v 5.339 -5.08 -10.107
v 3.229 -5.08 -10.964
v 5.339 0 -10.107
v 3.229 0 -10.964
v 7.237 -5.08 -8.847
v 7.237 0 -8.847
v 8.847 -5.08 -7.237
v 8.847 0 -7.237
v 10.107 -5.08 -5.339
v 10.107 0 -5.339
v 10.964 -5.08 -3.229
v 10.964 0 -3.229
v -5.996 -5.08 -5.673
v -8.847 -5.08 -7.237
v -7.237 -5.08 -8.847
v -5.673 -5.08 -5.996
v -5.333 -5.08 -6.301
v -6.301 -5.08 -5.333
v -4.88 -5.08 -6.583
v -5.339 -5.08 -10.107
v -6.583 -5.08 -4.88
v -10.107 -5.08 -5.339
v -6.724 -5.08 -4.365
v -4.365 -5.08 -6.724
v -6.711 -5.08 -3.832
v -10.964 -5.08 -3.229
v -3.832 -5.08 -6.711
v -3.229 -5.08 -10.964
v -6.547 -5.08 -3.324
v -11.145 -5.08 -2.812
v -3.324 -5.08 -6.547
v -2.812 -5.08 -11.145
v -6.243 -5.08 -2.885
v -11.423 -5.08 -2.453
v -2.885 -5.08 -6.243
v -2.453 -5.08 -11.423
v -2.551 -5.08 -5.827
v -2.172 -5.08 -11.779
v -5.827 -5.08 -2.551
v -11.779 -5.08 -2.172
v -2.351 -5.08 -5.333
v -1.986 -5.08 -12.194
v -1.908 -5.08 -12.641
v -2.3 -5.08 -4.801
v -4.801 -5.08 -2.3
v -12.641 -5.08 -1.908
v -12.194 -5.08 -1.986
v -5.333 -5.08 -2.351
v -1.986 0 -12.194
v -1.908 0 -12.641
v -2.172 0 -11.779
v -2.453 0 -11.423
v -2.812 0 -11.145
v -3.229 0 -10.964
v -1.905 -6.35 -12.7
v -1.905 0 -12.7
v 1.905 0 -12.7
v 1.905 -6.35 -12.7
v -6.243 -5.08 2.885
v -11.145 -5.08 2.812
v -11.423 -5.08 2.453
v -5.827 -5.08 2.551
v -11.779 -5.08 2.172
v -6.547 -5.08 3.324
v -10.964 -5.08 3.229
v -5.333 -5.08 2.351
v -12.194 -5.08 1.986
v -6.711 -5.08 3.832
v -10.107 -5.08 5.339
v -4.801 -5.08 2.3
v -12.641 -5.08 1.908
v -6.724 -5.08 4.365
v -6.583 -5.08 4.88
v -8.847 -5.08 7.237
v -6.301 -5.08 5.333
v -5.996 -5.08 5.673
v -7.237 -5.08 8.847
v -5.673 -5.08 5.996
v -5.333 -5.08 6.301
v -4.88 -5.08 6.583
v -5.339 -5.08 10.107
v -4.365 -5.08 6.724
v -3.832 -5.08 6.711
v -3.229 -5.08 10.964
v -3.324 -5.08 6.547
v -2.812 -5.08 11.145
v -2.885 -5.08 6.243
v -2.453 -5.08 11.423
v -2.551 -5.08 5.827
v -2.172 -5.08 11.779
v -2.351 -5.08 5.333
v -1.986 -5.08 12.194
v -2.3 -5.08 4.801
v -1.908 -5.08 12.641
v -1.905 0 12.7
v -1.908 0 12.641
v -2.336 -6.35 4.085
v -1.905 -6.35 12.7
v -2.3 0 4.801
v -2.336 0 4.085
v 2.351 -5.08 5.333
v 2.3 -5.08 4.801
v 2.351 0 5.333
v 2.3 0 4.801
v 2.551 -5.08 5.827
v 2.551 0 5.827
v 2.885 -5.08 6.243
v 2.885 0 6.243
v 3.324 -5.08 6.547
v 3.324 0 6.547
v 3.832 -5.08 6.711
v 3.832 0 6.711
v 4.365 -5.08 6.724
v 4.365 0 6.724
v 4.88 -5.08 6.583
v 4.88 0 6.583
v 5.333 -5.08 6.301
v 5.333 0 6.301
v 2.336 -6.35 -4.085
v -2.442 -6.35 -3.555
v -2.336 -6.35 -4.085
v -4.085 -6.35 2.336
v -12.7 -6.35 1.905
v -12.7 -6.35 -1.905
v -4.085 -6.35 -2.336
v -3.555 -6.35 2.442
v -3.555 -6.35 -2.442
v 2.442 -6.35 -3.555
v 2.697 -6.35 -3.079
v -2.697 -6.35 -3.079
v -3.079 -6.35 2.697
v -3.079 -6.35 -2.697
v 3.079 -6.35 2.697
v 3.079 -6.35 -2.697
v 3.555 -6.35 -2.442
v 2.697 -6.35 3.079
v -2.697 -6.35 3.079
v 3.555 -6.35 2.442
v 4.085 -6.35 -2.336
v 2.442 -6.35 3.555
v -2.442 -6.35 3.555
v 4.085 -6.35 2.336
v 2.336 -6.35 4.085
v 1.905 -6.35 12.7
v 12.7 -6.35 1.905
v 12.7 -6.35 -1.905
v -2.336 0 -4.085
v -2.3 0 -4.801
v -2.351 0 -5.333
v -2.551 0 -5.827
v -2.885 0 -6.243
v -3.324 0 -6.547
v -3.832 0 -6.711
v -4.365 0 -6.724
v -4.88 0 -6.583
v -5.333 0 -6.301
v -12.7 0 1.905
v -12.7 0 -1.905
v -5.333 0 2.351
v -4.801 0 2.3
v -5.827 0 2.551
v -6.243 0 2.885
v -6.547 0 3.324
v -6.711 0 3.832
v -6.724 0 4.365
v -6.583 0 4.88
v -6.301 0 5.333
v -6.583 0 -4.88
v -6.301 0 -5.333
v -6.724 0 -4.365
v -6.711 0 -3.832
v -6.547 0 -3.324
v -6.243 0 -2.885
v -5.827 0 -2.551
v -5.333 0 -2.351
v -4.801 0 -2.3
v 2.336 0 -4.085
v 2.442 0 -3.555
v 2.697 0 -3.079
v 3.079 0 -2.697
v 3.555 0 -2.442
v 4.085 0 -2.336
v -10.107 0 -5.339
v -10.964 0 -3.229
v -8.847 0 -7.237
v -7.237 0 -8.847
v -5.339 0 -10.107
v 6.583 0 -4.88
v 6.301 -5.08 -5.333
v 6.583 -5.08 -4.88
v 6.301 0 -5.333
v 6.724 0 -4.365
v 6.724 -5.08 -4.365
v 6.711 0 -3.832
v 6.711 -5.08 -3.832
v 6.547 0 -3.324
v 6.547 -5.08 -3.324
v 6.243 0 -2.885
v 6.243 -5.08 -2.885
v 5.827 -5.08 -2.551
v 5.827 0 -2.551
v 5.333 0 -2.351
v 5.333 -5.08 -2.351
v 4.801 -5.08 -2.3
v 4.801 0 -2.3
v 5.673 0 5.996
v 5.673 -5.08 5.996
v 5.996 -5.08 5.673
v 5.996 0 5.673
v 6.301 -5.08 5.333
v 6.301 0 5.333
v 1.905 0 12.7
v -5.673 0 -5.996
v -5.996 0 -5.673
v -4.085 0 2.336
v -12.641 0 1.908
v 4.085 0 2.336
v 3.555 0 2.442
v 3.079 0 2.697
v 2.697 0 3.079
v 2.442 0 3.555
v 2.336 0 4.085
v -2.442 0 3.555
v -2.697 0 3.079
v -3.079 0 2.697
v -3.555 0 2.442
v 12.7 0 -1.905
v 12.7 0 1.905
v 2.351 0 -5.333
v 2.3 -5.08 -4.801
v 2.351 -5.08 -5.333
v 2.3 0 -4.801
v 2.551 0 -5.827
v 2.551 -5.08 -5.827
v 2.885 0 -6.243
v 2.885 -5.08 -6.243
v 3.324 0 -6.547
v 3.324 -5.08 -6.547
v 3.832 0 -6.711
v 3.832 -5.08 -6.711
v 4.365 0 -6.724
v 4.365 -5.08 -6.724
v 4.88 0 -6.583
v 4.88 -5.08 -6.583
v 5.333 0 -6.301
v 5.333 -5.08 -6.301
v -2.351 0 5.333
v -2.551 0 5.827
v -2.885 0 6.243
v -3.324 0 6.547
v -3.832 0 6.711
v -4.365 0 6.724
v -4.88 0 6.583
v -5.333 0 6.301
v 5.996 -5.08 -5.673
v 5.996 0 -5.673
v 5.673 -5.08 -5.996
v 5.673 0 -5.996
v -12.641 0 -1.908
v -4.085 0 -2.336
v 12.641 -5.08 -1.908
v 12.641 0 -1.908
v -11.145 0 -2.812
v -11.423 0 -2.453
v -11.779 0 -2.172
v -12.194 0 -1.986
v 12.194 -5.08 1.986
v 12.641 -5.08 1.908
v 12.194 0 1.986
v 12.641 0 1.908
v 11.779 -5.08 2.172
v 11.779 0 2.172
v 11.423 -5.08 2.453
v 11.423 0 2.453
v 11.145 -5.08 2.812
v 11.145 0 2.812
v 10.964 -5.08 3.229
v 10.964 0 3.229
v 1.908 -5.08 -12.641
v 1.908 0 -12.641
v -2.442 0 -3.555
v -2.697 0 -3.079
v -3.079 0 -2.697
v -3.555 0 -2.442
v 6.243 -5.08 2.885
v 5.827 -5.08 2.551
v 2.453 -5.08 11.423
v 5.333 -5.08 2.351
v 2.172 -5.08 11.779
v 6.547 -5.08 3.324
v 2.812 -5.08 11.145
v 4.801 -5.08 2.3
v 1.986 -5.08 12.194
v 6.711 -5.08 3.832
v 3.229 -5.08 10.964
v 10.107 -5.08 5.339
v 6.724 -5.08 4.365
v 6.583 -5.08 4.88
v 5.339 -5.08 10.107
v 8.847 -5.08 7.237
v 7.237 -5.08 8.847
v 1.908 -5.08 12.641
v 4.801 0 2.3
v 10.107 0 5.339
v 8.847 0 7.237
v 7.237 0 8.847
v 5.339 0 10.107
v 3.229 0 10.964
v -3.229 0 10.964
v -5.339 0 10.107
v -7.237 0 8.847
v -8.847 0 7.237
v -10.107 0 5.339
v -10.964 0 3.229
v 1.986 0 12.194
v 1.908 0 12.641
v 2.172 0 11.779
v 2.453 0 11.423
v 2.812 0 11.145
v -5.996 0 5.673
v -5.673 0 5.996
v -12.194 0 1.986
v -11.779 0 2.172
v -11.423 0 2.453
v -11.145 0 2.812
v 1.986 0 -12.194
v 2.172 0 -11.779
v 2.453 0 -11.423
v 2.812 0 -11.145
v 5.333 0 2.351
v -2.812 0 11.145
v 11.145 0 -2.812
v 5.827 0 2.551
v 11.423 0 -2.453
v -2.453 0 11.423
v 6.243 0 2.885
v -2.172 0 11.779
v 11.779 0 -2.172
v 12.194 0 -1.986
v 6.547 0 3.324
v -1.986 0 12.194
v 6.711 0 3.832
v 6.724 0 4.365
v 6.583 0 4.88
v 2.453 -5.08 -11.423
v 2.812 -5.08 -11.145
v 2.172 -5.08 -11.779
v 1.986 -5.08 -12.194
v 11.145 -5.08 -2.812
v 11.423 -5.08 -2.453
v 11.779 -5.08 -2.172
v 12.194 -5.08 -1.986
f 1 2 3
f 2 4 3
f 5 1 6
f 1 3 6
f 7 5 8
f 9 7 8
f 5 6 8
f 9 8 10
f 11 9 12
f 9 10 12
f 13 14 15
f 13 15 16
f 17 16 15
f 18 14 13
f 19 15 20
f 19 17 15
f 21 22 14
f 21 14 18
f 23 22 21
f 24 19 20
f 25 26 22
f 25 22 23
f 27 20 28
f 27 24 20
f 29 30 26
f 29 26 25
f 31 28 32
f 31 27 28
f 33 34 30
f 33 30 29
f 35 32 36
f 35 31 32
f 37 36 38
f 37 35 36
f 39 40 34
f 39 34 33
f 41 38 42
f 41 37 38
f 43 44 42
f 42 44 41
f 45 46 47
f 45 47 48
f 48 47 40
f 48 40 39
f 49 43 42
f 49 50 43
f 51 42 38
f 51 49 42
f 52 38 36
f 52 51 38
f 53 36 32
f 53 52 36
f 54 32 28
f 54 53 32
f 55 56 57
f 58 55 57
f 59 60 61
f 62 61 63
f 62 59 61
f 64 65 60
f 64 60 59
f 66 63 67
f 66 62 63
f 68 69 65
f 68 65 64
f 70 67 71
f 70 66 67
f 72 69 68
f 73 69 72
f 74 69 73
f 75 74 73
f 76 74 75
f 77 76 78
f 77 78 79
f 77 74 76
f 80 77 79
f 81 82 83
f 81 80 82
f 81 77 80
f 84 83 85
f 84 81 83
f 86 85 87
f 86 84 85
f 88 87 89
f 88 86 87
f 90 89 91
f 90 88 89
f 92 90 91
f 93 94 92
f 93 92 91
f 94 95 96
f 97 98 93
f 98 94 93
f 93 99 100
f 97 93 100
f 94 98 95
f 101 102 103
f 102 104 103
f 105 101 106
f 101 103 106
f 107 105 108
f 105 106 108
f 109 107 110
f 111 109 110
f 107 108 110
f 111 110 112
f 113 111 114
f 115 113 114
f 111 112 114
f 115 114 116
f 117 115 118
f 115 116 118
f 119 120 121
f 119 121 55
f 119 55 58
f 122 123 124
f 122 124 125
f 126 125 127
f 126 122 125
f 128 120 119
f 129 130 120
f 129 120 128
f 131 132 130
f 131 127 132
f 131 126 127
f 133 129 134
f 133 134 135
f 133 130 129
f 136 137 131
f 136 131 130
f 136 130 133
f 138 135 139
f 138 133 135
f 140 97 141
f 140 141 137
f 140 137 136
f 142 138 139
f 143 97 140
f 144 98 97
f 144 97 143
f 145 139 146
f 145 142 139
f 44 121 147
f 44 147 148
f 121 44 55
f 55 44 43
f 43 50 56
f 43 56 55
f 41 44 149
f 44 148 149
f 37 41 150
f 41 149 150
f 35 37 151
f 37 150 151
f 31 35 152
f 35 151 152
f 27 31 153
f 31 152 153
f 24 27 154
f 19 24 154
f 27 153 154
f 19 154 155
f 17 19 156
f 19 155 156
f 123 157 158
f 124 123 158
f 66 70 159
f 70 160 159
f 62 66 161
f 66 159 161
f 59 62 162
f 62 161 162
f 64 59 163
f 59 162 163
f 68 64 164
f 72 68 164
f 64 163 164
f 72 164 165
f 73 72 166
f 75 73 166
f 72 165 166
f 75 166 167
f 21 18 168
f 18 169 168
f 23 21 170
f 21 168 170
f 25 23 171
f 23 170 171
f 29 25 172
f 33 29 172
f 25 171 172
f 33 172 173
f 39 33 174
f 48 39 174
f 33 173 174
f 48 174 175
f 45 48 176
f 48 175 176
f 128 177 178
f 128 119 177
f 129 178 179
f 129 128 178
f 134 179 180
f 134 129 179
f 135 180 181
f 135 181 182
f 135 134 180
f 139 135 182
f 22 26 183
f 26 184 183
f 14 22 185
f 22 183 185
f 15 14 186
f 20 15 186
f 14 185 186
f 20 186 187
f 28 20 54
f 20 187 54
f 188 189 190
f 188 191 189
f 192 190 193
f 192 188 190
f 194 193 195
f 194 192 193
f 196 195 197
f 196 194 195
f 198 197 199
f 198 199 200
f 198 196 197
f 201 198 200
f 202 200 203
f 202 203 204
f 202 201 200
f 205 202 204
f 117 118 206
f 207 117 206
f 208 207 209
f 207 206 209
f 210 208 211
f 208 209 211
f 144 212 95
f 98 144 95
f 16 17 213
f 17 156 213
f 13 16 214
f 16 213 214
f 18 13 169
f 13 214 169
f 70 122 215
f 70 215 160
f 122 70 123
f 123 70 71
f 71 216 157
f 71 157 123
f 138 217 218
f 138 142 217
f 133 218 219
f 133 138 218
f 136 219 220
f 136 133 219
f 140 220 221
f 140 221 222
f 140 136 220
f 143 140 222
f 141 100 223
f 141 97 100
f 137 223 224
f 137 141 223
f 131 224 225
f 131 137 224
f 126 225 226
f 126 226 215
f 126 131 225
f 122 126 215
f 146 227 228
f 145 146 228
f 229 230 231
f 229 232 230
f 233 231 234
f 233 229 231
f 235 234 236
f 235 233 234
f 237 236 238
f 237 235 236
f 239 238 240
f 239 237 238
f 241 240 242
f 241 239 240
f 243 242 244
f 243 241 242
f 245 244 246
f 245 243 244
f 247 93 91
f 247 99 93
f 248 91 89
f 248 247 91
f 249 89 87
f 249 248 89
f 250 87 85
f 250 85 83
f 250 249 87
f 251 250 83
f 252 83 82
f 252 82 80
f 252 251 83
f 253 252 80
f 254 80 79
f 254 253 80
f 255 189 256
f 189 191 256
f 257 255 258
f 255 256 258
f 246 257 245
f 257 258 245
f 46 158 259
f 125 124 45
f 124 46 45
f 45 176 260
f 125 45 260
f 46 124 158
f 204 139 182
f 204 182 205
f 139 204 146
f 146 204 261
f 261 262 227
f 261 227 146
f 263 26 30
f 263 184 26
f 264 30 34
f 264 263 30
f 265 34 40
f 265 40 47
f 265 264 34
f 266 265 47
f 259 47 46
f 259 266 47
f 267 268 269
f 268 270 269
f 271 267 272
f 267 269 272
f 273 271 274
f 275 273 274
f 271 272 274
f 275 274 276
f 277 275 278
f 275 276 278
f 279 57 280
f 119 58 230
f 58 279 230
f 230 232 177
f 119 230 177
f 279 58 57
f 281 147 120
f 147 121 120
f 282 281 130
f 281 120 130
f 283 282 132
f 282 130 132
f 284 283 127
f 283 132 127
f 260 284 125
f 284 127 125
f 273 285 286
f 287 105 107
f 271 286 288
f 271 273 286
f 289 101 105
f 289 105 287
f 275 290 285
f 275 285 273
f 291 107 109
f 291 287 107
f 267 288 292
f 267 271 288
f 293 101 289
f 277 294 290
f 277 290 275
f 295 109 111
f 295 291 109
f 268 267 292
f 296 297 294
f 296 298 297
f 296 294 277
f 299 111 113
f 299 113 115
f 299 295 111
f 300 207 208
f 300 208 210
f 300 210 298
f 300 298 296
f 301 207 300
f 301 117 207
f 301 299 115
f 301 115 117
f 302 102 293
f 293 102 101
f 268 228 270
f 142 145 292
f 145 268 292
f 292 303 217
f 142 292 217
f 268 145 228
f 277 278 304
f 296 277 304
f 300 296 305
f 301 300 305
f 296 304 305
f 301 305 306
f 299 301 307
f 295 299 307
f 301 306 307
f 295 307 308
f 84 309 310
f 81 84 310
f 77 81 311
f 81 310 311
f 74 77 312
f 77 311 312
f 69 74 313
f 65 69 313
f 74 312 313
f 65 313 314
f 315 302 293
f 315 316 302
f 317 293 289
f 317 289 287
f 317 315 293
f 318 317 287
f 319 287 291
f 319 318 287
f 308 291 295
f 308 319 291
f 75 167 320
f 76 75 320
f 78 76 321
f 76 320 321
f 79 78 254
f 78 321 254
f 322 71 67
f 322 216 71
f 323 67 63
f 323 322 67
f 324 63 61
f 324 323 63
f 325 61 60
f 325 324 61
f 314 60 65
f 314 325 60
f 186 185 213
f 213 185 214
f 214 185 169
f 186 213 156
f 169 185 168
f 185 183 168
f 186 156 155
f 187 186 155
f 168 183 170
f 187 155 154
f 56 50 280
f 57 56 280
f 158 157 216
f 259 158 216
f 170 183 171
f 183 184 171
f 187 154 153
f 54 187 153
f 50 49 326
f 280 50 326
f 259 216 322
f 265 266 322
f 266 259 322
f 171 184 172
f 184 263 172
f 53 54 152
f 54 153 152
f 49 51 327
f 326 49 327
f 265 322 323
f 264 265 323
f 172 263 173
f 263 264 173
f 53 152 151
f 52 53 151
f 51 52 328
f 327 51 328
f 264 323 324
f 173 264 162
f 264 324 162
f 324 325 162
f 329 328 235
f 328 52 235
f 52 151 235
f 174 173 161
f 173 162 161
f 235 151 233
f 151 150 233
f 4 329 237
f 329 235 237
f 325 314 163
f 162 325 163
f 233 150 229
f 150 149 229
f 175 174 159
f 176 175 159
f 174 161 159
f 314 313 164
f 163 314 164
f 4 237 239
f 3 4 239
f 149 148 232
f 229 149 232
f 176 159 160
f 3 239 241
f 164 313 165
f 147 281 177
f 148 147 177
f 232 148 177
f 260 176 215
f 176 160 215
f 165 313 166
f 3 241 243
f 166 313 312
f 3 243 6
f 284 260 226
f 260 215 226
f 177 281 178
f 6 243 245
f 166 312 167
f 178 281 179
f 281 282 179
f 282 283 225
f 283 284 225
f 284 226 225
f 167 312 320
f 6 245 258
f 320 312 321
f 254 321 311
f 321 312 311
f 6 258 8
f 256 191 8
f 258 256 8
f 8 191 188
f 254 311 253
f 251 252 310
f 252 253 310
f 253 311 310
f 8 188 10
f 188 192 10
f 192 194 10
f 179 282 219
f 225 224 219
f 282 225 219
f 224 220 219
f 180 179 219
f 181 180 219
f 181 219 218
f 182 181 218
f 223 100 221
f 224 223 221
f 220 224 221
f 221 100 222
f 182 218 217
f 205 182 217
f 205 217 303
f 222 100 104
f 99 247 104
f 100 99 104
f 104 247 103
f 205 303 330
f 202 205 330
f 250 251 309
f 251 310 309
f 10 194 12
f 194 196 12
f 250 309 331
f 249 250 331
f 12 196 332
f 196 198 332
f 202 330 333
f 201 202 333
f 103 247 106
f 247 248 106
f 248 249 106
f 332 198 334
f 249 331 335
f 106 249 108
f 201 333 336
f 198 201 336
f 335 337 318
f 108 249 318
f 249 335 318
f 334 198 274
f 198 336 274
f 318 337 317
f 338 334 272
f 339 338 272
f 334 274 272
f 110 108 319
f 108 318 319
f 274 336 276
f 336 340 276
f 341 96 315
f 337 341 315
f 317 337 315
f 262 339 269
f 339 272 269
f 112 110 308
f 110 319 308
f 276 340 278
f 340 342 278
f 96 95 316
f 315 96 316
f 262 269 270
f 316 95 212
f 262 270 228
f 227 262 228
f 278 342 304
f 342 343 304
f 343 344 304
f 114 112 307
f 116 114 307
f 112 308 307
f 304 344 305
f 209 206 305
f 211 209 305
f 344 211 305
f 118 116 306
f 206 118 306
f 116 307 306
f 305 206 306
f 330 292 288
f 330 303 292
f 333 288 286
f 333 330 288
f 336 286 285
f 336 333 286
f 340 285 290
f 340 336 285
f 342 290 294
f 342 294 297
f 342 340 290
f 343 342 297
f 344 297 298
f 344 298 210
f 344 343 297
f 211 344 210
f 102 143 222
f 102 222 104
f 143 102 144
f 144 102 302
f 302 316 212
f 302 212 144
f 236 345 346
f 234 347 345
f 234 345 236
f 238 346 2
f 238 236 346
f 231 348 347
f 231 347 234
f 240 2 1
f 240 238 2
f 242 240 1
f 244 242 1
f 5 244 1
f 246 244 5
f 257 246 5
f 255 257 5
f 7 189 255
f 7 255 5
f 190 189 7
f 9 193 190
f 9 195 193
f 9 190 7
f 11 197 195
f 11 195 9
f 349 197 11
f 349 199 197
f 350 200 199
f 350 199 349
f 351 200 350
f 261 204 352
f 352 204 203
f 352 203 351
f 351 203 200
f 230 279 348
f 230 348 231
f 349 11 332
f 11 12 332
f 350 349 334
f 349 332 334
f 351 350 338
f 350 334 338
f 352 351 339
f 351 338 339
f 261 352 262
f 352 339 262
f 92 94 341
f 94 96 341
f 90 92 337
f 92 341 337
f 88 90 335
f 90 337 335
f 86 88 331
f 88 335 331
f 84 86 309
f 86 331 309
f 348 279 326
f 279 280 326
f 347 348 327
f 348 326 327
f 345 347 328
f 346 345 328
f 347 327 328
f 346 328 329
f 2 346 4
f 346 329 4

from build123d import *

# Parameters (mm, degrees)
F0_R     = 11.43
F1_DEPTH = 5.08
F3_D     = 16.51
F5_DEPTH = 6.35
F6_R     = 1.84404


# Not quite as in the source:
# - a feature names something its author has since deleted; it is built from what else it names


with BuildPart() as f1:
    # F0 (on Front) → F1 (new body)
    with BuildSketch(Plane.XZ):
        Circle(F0_R)
    extrude(amount=F1_DEPTH)

    # F3 (through all)
    with Locations(Plane.XZ.offset(5.08)):
        with Locations((0, 0)):
            Hole(F3_D / 2)

    # F4 (on Front) → F5 (join)
    with BuildSketch(Plane.XZ):
        Polygon((-2.419047619, -2.419047619), (-2.54, 0), (-2.419047619, 2.419047619), (-12.7, 1.905), (-12.7, -1.905), align=None)
        Polygon((0, -2.54), (-2.419047619, -2.419047619), (-1.905, -12.7), (1.905, -12.7), (2.419047619, -2.419047619), align=None)
        Polygon((2.419047619, 2.419047619), (2.54, 0), (2.419047619, -2.419047619), (12.7, -1.905), (12.7, 1.905), align=None)
        Polygon((-1.905, 12.7), (-2.419047619, 2.419047619), (0, 2.54), (2.419047619, 2.419047619), (1.905, 12.7), align=None)
        Polygon((0, 0), (-2.54, 0), (-2.419047619, -2.419047619), (0, -2.54), align=None)
        Polygon((0, 2.54), (0, 0), (2.54, 0), (2.419047619, 2.419047619), align=None)
        Polygon((-2.419047619, 2.419047619), (-2.54, 0), (0, 0), (0, 2.54), align=None)
        Polygon((2.54, 0), (0, 0), (0, -2.54), (2.419047619, -2.419047619), align=None)
    extrude(amount=F5_DEPTH)

    # F6
    f6_edges = [f1.edges().sort_by_distance(p)[0] for p in [
        (-2.419048, -3.175, -2.419048),
        (-2.419048, -3.175, 2.419048),
        (2.419048, -3.175, 2.419048),
        (2.419048, -3.175, -2.419048),
        (-11.257705, -2.54, -1.977115),
        (-1.977115, -2.54, -11.257705),
        (1.977115, -2.54, -11.257705),
        (11.257705, -2.54, -1.977115),
        (11.257705, -2.54, 1.977115),
        (1.977115, -2.54, 11.257705),
        (-1.977115, -2.54, 11.257705),
        (-11.257705, -2.54, 1.977115),
        (7.972423, -2.54, 2.141379),
        (7.972423, -2.54, -2.141379),
        (2.141379, -2.54, -7.972423),
        (-2.141379, -2.54, -7.972423),
        (-7.972423, -2.54, -2.141379),
        (-7.972423, -2.54, 2.141379),
        (-2.141379, -2.54, 7.972423),
        (2.141379, -2.54, 7.972423),
    ]]
    fillet(f6_edges, radius=F6_R)


solid = f1.part
